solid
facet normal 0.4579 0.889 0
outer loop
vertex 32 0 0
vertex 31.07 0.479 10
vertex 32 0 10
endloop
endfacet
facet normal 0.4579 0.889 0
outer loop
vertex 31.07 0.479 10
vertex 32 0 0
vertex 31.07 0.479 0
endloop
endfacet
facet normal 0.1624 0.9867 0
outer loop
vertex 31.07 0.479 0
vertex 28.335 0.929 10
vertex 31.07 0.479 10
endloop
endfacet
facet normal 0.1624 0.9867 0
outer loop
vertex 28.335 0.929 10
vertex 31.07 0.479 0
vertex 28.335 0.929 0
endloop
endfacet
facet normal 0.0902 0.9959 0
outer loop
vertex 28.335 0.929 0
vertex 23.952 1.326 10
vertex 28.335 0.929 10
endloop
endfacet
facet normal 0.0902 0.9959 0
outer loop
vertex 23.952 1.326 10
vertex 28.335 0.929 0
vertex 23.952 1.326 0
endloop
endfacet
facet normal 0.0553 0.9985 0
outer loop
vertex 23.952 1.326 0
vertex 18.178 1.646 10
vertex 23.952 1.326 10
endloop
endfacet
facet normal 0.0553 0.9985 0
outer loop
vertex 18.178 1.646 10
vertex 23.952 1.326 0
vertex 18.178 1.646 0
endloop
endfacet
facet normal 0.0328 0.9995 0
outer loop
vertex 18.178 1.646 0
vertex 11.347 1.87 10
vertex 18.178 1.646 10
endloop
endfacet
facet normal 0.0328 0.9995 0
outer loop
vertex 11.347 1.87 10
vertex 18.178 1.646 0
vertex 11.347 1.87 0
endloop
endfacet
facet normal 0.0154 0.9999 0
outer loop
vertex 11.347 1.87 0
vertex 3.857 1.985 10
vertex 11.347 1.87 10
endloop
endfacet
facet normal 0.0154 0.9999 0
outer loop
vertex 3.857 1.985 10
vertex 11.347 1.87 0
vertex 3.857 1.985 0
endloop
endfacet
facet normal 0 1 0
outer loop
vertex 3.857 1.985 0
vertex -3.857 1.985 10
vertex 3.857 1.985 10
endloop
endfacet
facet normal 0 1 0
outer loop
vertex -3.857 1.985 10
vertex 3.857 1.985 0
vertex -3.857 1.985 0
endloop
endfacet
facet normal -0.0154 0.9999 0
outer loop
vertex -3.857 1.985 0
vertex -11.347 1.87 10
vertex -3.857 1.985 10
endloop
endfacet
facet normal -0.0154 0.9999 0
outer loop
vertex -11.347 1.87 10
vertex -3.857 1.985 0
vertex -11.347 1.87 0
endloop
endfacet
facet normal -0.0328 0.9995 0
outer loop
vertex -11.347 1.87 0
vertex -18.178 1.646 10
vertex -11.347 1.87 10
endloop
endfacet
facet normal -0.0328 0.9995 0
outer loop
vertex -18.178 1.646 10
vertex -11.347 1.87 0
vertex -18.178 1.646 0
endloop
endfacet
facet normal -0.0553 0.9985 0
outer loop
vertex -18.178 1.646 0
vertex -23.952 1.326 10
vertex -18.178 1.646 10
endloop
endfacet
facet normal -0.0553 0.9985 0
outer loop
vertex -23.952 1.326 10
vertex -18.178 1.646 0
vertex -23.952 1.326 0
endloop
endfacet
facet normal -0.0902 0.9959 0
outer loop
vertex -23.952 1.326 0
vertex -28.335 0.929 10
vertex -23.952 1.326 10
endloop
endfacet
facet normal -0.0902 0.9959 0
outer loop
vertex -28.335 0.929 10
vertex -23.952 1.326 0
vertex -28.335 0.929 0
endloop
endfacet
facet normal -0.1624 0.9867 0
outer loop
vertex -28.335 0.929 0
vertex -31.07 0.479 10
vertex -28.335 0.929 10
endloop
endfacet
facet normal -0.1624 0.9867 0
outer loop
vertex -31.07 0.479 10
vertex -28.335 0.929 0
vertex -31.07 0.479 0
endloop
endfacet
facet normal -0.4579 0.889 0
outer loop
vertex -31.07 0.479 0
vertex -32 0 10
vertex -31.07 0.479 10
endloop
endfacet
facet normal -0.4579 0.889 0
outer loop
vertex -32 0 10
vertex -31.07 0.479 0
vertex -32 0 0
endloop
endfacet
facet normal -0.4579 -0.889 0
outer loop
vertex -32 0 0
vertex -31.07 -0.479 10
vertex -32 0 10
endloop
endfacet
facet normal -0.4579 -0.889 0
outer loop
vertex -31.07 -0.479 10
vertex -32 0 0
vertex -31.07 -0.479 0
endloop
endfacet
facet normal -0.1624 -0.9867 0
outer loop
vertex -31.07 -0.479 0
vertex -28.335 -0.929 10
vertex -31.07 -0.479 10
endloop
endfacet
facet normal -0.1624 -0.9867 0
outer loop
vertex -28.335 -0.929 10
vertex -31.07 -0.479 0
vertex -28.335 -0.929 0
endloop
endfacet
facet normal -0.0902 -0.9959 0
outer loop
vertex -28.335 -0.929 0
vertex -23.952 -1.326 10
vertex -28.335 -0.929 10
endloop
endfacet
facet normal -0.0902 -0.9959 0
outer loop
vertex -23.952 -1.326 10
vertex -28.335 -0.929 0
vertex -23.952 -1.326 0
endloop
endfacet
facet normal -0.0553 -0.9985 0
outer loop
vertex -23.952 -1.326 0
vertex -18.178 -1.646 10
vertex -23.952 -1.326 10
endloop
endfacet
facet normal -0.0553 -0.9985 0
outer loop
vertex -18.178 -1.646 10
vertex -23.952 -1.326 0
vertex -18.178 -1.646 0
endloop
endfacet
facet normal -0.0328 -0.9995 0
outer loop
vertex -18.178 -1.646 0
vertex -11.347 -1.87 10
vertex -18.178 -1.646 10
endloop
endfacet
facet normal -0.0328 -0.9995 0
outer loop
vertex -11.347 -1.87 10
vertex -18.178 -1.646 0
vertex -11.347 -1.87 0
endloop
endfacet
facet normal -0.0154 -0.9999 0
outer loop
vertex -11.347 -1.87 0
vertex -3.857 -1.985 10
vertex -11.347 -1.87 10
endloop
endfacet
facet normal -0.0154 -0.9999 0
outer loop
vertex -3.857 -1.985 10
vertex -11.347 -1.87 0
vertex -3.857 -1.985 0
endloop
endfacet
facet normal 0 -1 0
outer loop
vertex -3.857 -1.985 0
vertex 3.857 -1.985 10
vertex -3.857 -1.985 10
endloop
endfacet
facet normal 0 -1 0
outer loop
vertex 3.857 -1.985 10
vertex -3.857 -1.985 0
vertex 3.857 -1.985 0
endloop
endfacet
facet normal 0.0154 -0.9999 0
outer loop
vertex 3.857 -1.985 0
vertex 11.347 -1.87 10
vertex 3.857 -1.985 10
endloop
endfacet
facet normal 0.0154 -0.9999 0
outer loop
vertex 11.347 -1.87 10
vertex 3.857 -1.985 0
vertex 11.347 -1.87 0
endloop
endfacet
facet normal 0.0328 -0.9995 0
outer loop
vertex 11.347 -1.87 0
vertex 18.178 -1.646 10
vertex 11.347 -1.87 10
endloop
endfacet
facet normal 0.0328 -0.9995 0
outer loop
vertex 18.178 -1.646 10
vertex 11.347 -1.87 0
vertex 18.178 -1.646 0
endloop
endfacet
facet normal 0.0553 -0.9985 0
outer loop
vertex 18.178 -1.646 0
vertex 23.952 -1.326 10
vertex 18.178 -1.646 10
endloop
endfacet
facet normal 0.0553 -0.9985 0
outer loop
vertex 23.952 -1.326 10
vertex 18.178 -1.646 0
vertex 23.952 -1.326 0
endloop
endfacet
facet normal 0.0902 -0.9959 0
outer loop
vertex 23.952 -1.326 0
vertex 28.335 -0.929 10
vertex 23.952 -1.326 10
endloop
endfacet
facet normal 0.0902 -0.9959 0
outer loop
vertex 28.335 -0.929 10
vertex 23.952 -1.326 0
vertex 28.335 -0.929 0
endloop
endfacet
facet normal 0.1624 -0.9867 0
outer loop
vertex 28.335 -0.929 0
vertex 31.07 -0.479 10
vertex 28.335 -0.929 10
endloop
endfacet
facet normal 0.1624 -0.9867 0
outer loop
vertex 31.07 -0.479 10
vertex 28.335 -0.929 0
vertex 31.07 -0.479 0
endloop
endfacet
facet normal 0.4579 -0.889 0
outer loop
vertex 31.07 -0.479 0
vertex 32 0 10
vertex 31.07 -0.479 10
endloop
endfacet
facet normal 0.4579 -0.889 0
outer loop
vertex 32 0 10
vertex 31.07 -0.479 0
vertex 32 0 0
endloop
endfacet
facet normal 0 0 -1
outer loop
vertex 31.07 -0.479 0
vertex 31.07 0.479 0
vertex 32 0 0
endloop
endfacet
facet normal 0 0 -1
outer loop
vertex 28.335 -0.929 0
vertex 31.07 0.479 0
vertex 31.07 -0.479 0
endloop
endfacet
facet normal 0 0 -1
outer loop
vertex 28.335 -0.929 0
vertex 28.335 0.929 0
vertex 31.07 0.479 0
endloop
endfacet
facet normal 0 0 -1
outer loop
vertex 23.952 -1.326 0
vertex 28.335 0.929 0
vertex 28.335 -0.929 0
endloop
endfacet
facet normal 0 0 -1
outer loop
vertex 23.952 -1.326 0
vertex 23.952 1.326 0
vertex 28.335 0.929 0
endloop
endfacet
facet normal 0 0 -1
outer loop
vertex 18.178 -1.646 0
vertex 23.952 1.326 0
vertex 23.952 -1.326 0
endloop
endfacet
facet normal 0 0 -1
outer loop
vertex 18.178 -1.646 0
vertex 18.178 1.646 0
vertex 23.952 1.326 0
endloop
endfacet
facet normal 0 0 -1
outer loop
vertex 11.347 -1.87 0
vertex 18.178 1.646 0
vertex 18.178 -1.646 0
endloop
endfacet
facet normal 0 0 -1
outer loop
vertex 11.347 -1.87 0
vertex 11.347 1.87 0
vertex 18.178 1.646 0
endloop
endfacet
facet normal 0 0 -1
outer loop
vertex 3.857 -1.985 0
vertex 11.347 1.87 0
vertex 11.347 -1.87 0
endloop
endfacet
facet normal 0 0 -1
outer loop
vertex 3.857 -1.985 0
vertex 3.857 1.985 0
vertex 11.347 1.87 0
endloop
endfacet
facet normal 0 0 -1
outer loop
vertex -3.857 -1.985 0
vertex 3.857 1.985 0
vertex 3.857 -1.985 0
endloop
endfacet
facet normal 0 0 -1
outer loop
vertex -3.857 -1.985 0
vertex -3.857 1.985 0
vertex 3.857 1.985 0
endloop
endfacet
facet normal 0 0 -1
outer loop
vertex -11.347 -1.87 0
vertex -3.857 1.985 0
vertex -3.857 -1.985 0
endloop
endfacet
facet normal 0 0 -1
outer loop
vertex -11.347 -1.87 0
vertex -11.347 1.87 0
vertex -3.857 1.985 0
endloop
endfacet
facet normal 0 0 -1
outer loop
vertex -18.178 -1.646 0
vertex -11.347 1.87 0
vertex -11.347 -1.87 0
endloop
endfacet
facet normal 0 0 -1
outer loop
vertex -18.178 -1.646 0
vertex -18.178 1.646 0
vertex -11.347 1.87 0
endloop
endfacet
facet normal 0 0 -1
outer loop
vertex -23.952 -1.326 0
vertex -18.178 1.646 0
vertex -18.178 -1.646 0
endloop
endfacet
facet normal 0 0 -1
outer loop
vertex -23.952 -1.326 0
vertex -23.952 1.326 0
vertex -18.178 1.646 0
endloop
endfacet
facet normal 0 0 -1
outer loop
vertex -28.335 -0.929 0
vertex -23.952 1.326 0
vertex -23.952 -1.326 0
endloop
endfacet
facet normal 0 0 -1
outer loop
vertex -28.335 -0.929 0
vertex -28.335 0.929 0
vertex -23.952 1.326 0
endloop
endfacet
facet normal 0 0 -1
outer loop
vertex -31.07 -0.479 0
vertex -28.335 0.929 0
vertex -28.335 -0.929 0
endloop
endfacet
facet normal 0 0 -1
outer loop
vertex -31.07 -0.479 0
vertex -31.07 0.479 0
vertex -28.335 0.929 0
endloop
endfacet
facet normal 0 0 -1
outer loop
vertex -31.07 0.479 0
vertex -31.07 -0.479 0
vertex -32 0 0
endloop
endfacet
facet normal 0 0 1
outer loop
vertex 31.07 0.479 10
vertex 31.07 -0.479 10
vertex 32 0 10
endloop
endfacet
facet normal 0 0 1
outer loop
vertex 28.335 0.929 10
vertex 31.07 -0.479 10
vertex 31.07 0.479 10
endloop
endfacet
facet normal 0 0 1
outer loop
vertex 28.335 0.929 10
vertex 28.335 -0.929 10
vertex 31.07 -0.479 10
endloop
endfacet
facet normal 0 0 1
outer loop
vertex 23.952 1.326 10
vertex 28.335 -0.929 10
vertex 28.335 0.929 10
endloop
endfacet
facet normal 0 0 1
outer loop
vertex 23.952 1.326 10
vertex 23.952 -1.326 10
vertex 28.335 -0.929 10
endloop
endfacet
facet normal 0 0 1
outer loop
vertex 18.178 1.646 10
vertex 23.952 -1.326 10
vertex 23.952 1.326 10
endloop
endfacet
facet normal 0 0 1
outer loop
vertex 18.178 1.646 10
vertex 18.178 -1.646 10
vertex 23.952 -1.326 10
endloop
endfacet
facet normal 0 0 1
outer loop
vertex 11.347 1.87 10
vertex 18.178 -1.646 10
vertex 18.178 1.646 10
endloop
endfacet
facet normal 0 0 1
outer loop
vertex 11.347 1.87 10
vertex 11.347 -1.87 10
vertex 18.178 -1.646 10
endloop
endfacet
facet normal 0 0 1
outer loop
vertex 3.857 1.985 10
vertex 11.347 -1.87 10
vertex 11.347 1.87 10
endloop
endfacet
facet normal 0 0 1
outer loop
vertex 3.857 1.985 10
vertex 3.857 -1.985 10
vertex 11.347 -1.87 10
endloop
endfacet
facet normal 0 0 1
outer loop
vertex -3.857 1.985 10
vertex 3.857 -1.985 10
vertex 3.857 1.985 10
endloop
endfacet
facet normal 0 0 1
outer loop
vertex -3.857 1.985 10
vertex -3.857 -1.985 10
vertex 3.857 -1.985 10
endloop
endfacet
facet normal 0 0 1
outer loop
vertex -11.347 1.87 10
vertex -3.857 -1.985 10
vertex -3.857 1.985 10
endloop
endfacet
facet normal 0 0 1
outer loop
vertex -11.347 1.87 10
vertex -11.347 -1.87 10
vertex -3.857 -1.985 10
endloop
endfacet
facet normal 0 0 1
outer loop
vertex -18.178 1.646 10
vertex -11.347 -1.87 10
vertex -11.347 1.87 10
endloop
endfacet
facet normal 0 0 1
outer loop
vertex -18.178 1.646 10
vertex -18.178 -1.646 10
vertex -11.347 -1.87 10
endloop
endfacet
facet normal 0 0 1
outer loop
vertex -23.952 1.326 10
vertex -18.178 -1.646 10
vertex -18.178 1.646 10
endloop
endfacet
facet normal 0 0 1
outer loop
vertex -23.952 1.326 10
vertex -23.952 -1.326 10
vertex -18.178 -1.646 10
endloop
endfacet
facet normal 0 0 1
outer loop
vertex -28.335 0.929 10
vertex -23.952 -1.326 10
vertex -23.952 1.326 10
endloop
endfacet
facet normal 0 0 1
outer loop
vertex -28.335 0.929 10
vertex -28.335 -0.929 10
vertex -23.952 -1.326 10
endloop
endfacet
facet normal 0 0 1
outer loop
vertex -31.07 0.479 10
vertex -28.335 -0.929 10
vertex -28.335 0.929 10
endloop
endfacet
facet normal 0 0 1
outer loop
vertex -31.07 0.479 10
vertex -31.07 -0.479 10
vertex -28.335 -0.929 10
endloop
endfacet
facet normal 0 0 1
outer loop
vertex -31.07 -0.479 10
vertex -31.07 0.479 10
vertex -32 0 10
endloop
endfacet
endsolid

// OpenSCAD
// Generated by generate_scads.py
scale([2.0,0.5,1.0]) {
  scale([2.0,0.5,0.5]) {
    cylinder(h=20, r=8, center=false);
  }
}
